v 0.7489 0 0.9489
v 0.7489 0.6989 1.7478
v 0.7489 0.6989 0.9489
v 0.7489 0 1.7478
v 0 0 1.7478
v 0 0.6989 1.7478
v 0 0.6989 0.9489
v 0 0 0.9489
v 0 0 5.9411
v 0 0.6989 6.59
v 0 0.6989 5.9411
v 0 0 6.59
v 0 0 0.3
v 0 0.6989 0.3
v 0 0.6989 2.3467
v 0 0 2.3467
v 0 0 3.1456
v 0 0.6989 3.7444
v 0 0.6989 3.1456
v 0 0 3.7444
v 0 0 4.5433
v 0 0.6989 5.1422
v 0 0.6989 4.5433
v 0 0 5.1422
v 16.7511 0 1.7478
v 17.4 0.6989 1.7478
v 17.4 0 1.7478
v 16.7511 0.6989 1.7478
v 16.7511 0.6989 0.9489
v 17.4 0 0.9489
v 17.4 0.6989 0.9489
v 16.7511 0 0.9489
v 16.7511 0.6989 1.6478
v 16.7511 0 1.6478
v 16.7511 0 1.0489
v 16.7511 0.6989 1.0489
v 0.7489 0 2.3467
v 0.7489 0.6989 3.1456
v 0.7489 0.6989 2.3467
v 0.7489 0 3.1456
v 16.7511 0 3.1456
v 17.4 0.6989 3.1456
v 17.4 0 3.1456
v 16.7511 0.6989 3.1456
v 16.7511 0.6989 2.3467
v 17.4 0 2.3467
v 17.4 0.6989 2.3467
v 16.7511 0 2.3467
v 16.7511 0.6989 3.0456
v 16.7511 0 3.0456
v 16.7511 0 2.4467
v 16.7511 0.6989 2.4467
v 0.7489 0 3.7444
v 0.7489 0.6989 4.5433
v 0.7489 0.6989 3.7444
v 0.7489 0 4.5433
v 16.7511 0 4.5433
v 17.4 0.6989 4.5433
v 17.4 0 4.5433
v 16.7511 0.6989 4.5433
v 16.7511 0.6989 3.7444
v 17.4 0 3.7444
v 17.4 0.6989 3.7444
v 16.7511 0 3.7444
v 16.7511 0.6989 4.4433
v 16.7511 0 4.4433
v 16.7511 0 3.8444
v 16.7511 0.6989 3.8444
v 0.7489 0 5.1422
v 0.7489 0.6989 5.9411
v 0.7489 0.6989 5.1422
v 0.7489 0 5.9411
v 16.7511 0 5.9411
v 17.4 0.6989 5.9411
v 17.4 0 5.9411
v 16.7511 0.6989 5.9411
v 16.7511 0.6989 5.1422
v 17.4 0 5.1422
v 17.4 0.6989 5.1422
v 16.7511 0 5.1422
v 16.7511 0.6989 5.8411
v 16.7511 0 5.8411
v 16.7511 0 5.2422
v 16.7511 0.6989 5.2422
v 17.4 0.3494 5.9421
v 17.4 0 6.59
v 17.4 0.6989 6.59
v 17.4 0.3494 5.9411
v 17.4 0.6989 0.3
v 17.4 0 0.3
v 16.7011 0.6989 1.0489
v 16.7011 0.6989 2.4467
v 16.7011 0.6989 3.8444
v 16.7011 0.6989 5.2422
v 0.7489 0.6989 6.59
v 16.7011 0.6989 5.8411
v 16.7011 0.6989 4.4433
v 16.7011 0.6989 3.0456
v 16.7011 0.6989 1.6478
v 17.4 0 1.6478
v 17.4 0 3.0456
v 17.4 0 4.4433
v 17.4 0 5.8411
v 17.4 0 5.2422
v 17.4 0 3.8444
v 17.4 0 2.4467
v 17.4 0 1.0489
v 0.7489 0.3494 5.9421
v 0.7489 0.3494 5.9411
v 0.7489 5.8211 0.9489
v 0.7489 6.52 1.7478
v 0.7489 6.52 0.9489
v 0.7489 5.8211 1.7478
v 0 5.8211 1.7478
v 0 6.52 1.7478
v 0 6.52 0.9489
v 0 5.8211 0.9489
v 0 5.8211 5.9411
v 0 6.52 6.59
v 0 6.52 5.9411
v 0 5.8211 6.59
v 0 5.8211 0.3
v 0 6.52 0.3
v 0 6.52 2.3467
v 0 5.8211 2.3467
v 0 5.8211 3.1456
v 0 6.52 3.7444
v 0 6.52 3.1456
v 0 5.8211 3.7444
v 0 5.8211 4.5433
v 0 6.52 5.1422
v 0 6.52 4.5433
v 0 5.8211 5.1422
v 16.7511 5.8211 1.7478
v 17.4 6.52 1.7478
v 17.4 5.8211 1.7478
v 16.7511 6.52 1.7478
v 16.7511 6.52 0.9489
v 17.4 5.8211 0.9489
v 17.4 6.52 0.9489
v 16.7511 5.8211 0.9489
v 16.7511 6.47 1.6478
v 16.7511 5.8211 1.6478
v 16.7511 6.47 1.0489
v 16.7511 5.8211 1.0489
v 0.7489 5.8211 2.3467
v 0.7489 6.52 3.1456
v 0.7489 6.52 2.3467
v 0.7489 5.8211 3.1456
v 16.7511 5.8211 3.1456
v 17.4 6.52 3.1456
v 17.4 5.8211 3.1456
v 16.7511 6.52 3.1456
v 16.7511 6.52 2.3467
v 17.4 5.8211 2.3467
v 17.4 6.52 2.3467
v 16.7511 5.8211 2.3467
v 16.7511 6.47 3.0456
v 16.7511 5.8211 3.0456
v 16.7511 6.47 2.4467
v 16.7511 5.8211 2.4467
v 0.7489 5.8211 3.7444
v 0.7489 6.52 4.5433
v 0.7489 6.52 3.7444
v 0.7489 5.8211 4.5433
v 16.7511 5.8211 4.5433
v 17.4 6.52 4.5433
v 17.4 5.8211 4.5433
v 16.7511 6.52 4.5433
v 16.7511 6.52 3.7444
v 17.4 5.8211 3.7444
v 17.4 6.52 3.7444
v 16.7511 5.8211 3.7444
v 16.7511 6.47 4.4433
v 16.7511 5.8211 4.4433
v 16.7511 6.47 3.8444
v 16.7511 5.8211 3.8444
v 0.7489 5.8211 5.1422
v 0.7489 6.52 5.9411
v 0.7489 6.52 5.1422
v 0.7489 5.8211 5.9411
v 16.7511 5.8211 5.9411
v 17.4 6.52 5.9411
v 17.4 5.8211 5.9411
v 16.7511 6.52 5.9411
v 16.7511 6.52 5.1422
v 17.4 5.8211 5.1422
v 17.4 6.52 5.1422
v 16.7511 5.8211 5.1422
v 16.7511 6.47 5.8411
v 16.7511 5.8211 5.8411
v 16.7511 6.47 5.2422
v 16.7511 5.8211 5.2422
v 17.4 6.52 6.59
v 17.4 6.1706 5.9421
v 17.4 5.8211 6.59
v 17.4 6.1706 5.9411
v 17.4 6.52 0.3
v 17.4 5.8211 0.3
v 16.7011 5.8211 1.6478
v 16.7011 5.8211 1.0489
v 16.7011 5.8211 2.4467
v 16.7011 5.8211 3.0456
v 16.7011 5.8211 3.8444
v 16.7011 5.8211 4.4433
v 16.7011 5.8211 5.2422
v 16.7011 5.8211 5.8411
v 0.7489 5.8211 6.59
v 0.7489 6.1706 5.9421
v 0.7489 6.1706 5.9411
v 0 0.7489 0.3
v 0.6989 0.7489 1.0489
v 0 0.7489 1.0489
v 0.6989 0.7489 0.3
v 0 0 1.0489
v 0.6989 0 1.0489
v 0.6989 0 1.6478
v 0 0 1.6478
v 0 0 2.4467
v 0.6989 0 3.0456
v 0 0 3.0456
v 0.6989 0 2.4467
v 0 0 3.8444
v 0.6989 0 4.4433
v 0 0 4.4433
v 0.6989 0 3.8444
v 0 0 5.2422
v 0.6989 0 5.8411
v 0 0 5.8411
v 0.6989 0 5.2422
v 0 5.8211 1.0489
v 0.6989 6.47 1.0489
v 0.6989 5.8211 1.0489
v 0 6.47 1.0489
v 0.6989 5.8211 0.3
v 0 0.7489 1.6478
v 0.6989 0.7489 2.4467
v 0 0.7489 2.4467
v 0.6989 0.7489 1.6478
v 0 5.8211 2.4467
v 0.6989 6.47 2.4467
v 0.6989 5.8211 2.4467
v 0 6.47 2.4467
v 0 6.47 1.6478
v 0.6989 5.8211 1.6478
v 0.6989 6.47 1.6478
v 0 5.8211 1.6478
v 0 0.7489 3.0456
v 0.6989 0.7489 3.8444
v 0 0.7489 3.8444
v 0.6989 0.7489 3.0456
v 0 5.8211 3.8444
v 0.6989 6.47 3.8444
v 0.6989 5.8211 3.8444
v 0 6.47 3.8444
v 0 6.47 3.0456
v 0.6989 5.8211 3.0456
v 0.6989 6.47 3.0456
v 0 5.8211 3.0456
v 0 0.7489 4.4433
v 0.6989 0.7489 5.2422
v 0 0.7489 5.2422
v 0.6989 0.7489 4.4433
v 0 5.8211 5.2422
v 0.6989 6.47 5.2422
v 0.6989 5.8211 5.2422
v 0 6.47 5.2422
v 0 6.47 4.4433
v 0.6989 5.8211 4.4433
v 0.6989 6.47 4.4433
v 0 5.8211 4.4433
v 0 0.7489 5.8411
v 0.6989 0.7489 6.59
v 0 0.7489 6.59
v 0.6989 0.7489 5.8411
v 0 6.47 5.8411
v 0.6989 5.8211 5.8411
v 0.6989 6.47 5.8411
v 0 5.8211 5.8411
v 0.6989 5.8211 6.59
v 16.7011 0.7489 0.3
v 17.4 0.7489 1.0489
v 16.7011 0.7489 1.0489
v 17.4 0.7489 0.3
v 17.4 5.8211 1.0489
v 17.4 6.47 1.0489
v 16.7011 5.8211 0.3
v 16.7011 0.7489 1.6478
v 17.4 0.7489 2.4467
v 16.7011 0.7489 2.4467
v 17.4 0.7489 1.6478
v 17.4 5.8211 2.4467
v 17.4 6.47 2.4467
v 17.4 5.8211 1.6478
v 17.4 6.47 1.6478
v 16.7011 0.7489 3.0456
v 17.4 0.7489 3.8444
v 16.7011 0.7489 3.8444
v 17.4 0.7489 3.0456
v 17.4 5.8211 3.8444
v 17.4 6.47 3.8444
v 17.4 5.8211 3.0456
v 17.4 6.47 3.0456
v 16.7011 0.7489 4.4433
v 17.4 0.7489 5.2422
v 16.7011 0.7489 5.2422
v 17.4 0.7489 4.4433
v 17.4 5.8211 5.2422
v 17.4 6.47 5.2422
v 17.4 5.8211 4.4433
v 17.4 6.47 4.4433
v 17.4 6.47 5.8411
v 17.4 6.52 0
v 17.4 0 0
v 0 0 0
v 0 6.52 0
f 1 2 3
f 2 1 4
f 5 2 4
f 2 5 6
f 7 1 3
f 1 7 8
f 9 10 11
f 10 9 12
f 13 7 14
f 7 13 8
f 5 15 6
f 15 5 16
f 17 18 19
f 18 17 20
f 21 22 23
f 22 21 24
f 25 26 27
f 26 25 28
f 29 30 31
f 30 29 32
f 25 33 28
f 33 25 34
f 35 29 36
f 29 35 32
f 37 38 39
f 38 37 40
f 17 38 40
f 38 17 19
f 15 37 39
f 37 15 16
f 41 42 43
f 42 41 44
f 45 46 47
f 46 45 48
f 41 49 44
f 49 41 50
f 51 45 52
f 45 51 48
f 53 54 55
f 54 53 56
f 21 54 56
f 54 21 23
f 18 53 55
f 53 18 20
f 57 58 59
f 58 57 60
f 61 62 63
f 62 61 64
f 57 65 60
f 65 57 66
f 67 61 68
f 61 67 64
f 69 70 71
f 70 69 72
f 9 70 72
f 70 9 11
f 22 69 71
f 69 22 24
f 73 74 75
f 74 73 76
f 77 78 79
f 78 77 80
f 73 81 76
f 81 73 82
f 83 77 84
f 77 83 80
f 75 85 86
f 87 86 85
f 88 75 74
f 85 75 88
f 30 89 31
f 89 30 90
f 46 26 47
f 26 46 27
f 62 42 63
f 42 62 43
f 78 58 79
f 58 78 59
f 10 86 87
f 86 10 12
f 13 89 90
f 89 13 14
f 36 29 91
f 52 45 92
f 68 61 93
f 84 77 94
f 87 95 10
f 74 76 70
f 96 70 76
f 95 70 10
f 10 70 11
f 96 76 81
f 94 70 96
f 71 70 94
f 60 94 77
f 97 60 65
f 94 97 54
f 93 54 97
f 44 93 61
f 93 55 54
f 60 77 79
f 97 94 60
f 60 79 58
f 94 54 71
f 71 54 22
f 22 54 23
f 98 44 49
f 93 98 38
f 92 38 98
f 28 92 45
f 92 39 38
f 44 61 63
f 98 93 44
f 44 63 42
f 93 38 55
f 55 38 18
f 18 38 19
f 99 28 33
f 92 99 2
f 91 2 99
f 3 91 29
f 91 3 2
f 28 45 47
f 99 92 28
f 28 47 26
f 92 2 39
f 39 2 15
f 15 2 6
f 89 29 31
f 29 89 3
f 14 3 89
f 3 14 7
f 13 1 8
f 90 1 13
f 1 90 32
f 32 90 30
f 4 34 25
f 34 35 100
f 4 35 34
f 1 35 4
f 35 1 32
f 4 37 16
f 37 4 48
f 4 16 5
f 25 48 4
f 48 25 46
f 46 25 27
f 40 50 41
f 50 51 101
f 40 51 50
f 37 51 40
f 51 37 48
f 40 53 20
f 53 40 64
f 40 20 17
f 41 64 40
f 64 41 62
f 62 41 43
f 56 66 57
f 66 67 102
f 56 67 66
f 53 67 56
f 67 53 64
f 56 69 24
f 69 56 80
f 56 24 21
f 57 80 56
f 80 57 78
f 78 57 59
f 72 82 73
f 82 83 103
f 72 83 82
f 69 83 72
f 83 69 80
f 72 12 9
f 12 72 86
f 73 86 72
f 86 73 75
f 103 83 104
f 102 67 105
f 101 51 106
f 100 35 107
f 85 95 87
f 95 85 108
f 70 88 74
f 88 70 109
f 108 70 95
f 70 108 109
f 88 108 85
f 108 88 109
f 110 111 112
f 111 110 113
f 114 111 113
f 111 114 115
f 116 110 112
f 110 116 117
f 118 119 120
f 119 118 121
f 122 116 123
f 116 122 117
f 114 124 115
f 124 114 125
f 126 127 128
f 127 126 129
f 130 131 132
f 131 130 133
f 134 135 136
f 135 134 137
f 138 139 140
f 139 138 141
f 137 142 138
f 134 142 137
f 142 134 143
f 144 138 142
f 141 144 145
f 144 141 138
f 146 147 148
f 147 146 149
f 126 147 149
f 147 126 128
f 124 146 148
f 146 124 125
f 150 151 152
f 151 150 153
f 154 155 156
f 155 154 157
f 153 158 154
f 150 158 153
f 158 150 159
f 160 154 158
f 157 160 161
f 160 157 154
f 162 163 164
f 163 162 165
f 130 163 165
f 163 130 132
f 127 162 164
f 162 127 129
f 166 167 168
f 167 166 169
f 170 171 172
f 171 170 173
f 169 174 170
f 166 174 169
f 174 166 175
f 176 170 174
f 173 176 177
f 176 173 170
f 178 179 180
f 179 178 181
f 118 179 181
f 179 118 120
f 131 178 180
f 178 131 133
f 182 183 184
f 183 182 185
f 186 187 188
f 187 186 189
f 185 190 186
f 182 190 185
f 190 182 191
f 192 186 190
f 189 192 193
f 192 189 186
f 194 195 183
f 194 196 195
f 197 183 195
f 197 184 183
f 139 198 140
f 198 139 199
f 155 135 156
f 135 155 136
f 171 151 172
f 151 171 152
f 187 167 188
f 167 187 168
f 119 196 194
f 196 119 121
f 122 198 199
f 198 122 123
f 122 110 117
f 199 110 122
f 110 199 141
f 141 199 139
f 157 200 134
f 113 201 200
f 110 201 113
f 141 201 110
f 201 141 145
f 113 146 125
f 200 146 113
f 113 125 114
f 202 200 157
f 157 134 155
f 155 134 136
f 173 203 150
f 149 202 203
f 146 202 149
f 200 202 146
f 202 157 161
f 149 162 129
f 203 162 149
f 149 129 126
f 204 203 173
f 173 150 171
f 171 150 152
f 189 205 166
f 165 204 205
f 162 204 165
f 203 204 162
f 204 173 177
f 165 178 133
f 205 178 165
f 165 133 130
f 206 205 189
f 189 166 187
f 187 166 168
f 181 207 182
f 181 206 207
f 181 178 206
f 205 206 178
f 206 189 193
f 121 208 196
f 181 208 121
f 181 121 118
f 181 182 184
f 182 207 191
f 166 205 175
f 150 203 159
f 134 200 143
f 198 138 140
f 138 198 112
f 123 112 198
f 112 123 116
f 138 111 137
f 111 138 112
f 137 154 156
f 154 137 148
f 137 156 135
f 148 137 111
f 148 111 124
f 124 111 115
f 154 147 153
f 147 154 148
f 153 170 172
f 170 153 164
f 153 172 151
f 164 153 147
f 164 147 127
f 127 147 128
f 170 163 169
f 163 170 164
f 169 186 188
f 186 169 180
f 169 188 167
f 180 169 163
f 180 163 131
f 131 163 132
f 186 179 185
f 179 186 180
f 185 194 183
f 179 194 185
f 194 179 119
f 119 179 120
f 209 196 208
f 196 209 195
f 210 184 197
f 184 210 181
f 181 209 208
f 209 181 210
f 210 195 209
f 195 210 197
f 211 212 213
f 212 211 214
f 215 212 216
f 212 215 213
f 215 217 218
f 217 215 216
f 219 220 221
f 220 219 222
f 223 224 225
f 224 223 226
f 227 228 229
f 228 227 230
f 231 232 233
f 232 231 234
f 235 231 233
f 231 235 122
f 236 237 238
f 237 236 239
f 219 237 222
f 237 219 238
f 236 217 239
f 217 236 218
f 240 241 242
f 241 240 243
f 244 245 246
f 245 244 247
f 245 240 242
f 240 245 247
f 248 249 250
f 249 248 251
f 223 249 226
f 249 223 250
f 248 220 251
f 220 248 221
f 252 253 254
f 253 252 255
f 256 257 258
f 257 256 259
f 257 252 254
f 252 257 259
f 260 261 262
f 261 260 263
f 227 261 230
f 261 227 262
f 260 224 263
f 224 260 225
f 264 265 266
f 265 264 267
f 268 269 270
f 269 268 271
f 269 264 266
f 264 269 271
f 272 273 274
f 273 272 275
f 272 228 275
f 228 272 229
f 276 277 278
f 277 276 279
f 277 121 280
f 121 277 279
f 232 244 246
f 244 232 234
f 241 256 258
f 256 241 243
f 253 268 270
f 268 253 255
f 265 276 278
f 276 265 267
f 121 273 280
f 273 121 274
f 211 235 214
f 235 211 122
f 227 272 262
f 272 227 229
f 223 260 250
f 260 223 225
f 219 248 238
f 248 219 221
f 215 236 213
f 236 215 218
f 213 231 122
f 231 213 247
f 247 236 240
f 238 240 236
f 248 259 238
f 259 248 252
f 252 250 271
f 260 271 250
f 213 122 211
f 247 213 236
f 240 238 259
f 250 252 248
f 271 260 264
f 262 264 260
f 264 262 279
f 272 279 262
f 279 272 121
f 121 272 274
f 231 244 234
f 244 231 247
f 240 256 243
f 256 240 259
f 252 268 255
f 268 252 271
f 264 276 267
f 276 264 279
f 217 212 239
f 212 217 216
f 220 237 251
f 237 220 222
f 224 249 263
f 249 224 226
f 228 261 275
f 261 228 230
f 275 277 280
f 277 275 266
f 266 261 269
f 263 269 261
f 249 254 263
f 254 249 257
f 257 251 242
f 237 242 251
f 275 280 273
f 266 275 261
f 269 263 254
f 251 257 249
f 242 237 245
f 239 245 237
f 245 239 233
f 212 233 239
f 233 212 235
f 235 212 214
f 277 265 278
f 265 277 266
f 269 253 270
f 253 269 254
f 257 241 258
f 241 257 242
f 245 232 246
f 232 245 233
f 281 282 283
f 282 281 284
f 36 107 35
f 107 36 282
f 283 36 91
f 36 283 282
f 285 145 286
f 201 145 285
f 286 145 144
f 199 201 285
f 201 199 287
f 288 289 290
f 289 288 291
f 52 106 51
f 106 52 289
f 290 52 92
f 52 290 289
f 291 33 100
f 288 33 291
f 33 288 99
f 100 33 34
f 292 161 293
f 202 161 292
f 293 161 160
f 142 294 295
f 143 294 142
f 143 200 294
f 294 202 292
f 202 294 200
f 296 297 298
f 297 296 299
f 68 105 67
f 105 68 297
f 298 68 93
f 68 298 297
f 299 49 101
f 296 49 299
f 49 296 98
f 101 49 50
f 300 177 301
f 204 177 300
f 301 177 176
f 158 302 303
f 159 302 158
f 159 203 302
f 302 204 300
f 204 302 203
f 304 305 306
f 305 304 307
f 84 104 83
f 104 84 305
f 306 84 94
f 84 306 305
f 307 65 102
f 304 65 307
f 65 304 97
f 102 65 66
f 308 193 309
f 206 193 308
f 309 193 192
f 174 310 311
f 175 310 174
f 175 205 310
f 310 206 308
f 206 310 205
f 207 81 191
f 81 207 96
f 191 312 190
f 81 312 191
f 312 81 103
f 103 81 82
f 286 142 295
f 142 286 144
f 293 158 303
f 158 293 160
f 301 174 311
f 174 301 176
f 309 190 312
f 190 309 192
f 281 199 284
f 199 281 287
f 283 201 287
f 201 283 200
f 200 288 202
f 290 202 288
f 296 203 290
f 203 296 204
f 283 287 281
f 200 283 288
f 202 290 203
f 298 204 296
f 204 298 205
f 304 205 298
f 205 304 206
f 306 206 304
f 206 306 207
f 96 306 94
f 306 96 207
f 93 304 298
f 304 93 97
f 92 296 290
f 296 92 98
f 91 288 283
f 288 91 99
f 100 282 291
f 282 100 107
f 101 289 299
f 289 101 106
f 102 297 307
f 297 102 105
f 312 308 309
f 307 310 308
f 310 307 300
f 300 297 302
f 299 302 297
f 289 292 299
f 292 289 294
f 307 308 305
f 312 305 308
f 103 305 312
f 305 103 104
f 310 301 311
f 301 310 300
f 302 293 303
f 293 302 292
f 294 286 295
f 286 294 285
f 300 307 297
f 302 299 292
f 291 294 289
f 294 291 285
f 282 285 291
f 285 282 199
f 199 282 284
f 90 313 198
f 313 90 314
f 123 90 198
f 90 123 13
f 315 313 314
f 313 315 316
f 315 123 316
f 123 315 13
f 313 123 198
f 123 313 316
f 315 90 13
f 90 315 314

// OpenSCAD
// file: dominoes.scad
/*

Dominoes

Carles Oriol i Margarit

*/

width=2.06;
height=4.135;

depth=1.08;
separatorWidht=.06;

depthwhite=depth*42/100;
depthblack=depth-depthwhite;

dotmargin=.45;

dotsize=.5;

fullposition = 2;

$fn=16;

 fulldomino( fullposition );

//domino(1,6);

 module fulldomino( fullposition = 0 )
{
   
    for(v1=[0:6])
    for(v2=[v1:6])
    {
        if( fullposition == 0) // piramid
            translate([v2*width*1.5, v1*height*1.25,0]) domino(v1, v2);
        
       if( fullposition == 1) // square
            translate([(_piecenum(v1,v2)%7)*width*1.5, 
                        floor(_piecenum(v1,v2)/7)*height*1.25,0]) domino(v1, v2);
       
        if( fullposition == 2) // inbox
            translate([(_piecenum(v1,v2)%7)*width*1.1,0, 
                        floor(_piecenum(v1,v2)/7)*(depth+(dotsize/2))*1.01]) domino(v1, v2);
    }

}

_piecemax=6;
_piecemaxsum=_piecemax*(_piecemax+1)/2;
function _piecenum (v1,v2) = 
    _piecemaxsum-((_piecemax-v1)*((_piecemax-v1)+1)/2)+v2;



module domino( v1, v2 )
{

    // black
    color([0,0,0]) 
    difference()
    {
    //cube([width,height, depthblack]);
    {
    translate([0,height,depthblack]) rotate([180,0,0]) toprbox( width,height, depthblack,width/16 );
    }
    

    {
    translate([-separatorWidht/2,0,depthblack-separatorWidht]) cube([separatorWidht,height,separatorWidht]);   
            translate([width-separatorWidht/2,0,depthblack-separatorWidht]) cube([separatorWidht,height,separatorWidht]);   
        
      translate([0, -separatorWidht/2,depthblack-separatorWidht])    cube([width,separatorWidht,separatorWidht]);   
              
       translate([0, height-separatorWidht/2,depthblack-separatorWidht])    cube([width,separatorWidht,separatorWidht]);  
    }
}

    
    difference()
    {
    color([1,1,1]) translate([0,0,depthblack]) 
        //cube([width,height, depthwhite]);
        toprbox( width,height, depthwhite,width/16 );
    
    // separator
    color([0,0,0]) 
    translate([width/2, height/2, depth]) 
    //cube([width,separatorWidht, separatorWidht], center=true);
    rotate([-1,90,0]) cylinder(r=separatorWidht/2, h=width +2, center=true);
        
       color([0,0,0]) domino_number( v1 );
       color([0,0,0]) translate ([0,height/2,0]) domino_number( v2 );
    }
    
    // support dot
    color([0.71875,	0.44921875,	0.19921875])
    translate([width/2, height/2, depth]) sphere(r=dotsize/2);

    
    
}


// dots

module domino_number( n )
{
    
    dotpos =  depth+dotsize/4;

    if( n > 1 )
    {
        translate([dotmargin, dotmargin, dotpos]) sphere(r=dotsize/2);
        translate([width-dotmargin, width-dotmargin, dotpos]) sphere(r=dotsize/2);
    }
    
    if( n >= 4 ) 
    {
        translate([width-dotmargin, dotmargin, dotpos]) sphere(r=dotsize/2);    
        translate([dotmargin, width-dotmargin, dotpos]) sphere(r=dotsize/2);
    }
    
    // six pair
    if( n == 6 )
    {
        translate([dotmargin, width/2, dotpos]) sphere(r=dotsize/2);
        translate([width-dotmargin, width/2, dotpos]) sphere(r=dotsize/2);
    }
    
    // central
    if( n%2==1 ) // evens
        translate([width/2, width/2, dotpos]) sphere(r=dotsize/2);
}

module toprbox( w, h, d, topradius )
{
    
    hull()
    {
    hull()
    {
    translate([topradius,topradius,d-topradius]) sphere( r=topradius );
    translate([w-topradius,topradius,d-topradius])  sphere( r=topradius );
    translate([w-topradius,h-topradius,d-topradius]) sphere( r=topradius );
    translate([topradius,h-topradius,d-topradius]) sphere( r=topradius );
    }
    
    hull()
    {
    translate([topradius,topradius,0]) cylinder( r=topradius, d-topradius );
    translate([w-topradius,topradius,0]) cylinder( r=topradius, d-topradius );
    translate([w-topradius,h-topradius,0])cylinder( r=topradius, d-topradius );
    translate([topradius,h-topradius,0]) cylinder( r=topradius, d-topradius );
    }
}
}
// main file
/*

Dominoes box

Carles Oriol
27/03/2015

*/

use <dominoes.scad>

box_width=17.4;
box_depth=6.52;
box_height=6.59;

box_base_height=.3;
box_cut_height=(box_height - box_base_height) /9;

box_incut_margin=.05;

 dent = (box_height - box_base_height) /9;


 dominoes_box( mode = 1); // 0 = mount closed, 1=mount open, 2 = on floor

// show domino set

//translate([box_incut_margin*6+box_cut_height, box_incut_margin*6+box_cut_height, box_base_height]) fulldomino( 2 );

module dominoes_box( mode )
{
    if( mode == 0 || mode == 1)
    {
    dominoes_box_base();
    translate([0,0,box_base_height])  dominoes_box_side();
    translate([0,box_depth,box_base_height]) mirror([0,1,0])  dominoes_box_side();
    translate([box_cut_height,0,box_base_height]) rotate([0,0,90])   dominoes_box_ends();
    
    translate([box_width,0,box_base_height]) rotate([0,0,90])  dominoes_box_open_end();
    }
    
     if( mode == 0 )
        translate([box_cut_height+box_incut_margin, box_cut_height+box_incut_margin,
                    box_height-(box_cut_height-box_incut_margin) ])  dominoes_box_precover();
    

     if( mode == 2 )
     {
        dominoes_box_base();
        translate([0,box_depth+box_cut_height,0]) dominoes_box_precover();
         translate([0,- box_cut_height,0]) rotate([90,0, 0]) dominoes_box_side();
        
      translate([0,-(box_height*2+box_cut_height),0])  rotate([-90,0, 0]) mirror([0,1,0]) dominoes_box_side();
         
        translate([-box_depth-box_cut_height ,- box_cut_height,0]) rotate([90,0, 0]) dominoes_box_ends();
       translate([-box_depth-box_cut_height,box_height+box_cut_height,0]) rotate([90,0, 0]) dominoes_box_open_end();

     }
}

module  dominoes_box_precover()

{   
    render()
    {
    difference()
    {
    translate([0,box_depth-box_cut_height-box_cut_height*.5-box_incut_margin*2,0]) 
    rotate( [0,0,-90] )
    trapeci(  
     
     box_depth- (box_cut_height/2+box_incut_margin)*2,
    box_depth- (box_cut_height+box_incut_margin)*2,
    
    box_width -(box_cut_height+box_incut_margin),
               
                box_cut_height-box_incut_margin);


      translate([box_width -(box_cut_height+box_incut_margin)-1.1,
                        (box_depth- (box_cut_height+box_incut_margin)*2)/2 , 
                        box_cut_height-box_incut_margin/2])

        
        difference()
     {
     resize([.6*2,3,.3]) sphere( r=2, $fn=16, center=true );
     
     translate([.3,0,0]) cube([.6,4,1], center=true);
     }
 }
 }
}

module  dominoes_box_cover()
{
    cube([  box_width -(box_cut_height+box_incut_margin),
                box_depth- (box_cut_height+box_incut_margin)*2,
                box_cut_height-box_incut_margin]);
}


module trapeci(a1,a2,d,h)
{
    hull()
    {
        cube([a1,d, 0.001]);
        translate([a1/2-a2/2,0,h-0.001]) cube([a2,d, 0.001]);
    }
}

//base
module dominoes_box_base()
    cube([box_width, box_depth,box_base_height]);

// side
module dominoes_box_side()
{
    render()
  difference()  
    {
    difference()
    {
    cube([box_width, box_cut_height, box_height - box_base_height ]);
    
    for( i = [0:3])
    {
        translate([0, -box_cut_height/2, dent*( i)*2+dent-box_incut_margin ])
            cube( [box_cut_height+box_incut_margin, box_cut_height*2, (dent+box_incut_margin*2) ]);
        
        translate([box_width-box_cut_height+box_incut_margin, -box_cut_height/2, dent*( i)*2+dent-box_incut_margin ])
            cube( [box_cut_height+box_incut_margin, box_cut_height*2, (dent+box_incut_margin*2) ]);
    }
    }
    
    
    translate([     box_cut_height+box_incut_margin, 
                    box_cut_height,
                    box_height-box_base_height-(box_cut_height-box_incut_margin) ])
   scale([1.1,1,1])
        dominoes_box_precover();
}
}


module dominoes_box_open_end()
{render()
    difference()
    {
        dominoes_box_ends();
        
        translate([box_cut_height+box_incut_margin,-.1,
        box_height-(box_cut_height+box_base_height+box_incut_margin)])
        
        cube([box_depth-box_incut_margin*2-box_cut_height ,
                    box_cut_height+box_incut_margin+.2,
                    box_cut_height+box_incut_margin]);
    }
}

module dominoes_box_ends()
{
   render()
    {
    itemwidth = box_depth-box_incut_margin;
    
    difference()
    {
    cube([itemwidth, box_cut_height, box_height - box_base_height ]);
    
    for( i = [0:4])
    {
        translate([0, -box_cut_height/2, dent*( i)*2 -box_incut_margin])
            cube( [box_cut_height+box_incut_margin, box_cut_height*2, (dent+box_incut_margin*2) ]);
        
         translate([itemwidth-box_cut_height+box_incut_margin, -box_cut_height/2, dent*( i)*2 -box_incut_margin])
            cube( [box_cut_height+box_incut_margin, box_cut_height*2, (dent+box_incut_margin*2) ]);
    }
    }
}
}
